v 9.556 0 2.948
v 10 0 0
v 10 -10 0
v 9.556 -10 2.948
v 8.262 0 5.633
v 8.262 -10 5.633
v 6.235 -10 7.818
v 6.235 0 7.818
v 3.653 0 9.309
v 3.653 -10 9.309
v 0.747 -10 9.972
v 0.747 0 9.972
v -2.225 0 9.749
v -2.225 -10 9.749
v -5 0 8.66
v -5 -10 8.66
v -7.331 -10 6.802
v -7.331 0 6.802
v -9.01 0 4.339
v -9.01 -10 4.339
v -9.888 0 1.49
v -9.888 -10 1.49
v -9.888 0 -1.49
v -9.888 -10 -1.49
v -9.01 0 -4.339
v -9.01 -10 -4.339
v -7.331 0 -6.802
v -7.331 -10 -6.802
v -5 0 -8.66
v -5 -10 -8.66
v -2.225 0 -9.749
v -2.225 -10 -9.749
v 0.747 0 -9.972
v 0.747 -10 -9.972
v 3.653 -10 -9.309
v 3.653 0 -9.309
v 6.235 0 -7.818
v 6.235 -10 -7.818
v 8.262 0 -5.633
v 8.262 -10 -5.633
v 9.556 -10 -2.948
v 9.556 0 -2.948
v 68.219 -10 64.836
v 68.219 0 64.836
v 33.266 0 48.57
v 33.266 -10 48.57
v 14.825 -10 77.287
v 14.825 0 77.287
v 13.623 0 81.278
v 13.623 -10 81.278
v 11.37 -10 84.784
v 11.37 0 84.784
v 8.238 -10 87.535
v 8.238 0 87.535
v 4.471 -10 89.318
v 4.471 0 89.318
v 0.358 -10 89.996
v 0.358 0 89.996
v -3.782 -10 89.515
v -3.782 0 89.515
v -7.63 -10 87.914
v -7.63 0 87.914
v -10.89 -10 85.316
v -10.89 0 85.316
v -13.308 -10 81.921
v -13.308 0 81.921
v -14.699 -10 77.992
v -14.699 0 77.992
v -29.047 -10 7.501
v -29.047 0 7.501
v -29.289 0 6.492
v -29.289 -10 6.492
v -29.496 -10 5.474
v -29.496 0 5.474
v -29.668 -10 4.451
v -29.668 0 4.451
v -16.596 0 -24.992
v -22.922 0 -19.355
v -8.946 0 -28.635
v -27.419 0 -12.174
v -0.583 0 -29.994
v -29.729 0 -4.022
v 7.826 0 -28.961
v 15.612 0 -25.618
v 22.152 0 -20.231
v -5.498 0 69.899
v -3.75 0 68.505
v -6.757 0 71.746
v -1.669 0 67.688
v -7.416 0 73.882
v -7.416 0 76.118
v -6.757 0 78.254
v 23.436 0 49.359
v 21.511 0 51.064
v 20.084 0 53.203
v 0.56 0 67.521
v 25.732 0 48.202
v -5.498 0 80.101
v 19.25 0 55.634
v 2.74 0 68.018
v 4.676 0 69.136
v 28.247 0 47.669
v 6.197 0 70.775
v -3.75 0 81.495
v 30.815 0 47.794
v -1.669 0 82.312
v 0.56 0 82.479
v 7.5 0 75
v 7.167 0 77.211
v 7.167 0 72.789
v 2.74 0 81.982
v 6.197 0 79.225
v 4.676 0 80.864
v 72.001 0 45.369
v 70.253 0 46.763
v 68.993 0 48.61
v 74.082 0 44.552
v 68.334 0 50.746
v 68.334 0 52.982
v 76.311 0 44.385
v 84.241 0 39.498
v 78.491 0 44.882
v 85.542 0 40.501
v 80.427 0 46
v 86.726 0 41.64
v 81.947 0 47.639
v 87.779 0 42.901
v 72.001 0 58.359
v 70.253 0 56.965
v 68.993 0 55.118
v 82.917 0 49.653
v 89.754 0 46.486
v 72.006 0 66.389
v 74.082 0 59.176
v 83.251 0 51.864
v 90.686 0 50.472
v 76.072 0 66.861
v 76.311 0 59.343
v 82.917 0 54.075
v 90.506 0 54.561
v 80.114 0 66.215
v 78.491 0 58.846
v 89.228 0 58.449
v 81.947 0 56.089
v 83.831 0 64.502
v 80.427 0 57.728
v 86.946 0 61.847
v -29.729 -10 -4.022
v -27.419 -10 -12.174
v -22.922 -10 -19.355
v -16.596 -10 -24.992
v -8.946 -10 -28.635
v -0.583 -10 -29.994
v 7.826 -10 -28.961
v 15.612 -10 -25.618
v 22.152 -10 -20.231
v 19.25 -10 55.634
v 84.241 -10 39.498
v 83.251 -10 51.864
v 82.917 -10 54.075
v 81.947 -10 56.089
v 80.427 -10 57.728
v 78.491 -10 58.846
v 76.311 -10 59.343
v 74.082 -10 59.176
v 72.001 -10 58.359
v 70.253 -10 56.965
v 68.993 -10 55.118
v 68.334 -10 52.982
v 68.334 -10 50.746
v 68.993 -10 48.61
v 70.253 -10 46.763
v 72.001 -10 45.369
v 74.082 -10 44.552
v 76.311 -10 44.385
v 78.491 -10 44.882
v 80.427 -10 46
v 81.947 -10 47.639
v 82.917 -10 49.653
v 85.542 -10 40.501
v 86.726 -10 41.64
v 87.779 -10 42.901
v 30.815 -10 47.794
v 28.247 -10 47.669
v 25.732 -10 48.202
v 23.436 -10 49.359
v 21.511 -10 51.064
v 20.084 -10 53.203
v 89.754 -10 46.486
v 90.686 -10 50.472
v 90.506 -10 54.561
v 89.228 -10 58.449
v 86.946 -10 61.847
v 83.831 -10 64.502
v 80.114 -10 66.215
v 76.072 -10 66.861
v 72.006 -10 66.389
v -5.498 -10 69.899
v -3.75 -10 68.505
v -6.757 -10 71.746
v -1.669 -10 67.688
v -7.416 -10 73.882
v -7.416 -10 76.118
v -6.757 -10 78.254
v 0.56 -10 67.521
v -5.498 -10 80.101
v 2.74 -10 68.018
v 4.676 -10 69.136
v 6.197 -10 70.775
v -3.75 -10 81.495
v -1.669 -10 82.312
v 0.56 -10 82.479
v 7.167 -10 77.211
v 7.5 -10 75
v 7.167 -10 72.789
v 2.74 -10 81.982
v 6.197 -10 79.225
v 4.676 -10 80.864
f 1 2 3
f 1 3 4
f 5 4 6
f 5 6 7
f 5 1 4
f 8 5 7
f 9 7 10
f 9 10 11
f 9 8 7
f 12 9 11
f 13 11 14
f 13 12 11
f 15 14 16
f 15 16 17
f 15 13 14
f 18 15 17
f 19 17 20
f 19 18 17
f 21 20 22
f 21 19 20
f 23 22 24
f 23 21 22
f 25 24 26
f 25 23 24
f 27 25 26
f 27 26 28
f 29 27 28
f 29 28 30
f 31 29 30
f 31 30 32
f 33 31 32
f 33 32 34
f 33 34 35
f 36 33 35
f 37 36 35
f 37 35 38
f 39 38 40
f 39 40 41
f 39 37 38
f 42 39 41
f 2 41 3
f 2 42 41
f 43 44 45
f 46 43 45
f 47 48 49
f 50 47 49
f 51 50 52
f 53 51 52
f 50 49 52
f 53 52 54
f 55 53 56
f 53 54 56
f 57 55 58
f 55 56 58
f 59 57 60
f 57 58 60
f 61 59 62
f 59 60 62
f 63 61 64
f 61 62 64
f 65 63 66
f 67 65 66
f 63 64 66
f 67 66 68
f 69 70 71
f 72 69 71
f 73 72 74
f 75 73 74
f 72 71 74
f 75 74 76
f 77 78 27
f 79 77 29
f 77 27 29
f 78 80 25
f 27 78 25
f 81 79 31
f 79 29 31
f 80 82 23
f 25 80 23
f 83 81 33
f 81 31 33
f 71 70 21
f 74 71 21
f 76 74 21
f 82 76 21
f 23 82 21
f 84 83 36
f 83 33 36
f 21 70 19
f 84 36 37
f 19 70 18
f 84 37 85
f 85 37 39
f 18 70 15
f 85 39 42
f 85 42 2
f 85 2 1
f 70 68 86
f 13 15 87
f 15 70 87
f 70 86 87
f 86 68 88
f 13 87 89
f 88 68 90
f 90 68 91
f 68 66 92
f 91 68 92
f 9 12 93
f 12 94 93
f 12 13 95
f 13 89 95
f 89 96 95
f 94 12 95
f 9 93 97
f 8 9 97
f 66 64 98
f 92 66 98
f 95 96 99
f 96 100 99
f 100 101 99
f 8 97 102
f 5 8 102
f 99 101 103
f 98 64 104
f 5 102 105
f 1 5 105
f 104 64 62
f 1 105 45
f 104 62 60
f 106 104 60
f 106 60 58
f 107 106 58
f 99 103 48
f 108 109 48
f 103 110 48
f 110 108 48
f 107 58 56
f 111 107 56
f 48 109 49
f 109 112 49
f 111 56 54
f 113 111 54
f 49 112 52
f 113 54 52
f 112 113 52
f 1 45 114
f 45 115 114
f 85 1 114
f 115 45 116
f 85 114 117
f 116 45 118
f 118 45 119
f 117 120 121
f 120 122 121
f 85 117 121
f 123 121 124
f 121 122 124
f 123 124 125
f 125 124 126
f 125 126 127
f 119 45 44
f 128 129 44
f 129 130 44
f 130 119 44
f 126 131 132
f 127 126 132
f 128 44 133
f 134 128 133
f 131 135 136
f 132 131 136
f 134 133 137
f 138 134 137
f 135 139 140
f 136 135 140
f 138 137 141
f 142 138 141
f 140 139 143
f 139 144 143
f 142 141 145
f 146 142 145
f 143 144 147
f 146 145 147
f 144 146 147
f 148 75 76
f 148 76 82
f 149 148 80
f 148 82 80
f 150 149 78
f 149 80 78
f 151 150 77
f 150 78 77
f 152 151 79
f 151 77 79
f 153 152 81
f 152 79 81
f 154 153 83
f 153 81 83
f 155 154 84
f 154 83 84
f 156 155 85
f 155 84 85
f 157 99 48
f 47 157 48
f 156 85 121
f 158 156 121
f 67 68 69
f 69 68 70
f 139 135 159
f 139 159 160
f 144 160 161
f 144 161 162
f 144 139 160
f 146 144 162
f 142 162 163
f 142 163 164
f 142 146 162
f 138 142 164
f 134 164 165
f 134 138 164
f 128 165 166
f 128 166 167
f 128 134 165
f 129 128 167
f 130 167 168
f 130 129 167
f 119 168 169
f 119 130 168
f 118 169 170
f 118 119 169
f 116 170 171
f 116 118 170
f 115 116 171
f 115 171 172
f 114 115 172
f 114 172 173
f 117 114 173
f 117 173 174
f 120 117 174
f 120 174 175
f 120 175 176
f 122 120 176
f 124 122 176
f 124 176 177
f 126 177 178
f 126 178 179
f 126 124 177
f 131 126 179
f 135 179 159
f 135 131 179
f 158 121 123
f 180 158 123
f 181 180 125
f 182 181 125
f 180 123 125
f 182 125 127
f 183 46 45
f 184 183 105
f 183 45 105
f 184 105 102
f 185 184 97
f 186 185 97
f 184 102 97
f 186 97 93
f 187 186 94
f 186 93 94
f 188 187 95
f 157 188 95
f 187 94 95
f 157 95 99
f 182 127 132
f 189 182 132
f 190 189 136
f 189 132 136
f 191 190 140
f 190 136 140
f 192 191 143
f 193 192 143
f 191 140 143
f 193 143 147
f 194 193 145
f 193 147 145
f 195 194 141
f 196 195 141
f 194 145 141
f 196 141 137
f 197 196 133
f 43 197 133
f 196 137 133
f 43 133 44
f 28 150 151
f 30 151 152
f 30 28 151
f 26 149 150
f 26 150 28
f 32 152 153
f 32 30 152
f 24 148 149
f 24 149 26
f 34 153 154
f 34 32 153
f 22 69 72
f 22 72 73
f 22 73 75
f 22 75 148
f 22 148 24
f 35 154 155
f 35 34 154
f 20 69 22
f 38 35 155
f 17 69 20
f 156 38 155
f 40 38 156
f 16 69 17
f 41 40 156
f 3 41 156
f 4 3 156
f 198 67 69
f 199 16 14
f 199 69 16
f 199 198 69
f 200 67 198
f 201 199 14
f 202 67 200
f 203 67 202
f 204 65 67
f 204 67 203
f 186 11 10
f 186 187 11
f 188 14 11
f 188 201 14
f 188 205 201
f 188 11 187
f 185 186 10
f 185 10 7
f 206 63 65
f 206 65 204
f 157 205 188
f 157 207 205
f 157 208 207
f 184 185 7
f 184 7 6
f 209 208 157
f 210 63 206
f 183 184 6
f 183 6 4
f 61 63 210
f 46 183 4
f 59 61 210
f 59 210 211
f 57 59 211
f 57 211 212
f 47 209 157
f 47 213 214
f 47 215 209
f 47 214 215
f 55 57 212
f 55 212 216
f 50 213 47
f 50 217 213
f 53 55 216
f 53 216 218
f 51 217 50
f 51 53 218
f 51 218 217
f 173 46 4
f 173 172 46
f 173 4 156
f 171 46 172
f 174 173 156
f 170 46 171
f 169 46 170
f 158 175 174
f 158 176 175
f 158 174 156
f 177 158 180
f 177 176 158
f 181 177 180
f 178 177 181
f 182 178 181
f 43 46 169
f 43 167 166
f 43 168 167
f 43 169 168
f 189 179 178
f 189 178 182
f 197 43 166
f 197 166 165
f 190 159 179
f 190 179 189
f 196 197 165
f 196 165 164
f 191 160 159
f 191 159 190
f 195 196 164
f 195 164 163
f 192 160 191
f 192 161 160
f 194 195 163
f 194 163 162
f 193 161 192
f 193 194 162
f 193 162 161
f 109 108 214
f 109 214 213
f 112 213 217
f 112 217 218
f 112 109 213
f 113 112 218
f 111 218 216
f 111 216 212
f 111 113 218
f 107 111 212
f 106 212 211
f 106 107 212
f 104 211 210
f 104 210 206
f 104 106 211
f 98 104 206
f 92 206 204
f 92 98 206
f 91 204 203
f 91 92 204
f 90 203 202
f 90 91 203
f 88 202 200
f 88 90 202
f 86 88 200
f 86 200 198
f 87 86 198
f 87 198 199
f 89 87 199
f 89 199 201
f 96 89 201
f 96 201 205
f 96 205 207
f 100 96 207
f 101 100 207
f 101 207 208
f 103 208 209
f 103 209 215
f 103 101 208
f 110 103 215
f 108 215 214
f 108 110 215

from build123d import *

# Parameters (mm, degrees)
F0_R     = 10
F0_R_2   = 7.5
F1_DEPTH = 10


with BuildPart() as f1:
    # F0 (on Front) → F1 (new body)
    with BuildSketch(Plane.XZ):
        with BuildLine():
            Line((19.249851, 55.634453), (14.824665, 77.286766))
            ThreePointArc((14.824665, 77.286766), (0.358168, 89.995723), (-14.698586, 77.991918))
            Line((-14.698586, 77.991918), (-29.047106, 7.501041))
            Line((-29.047106, 7.501041), (-29.668046, 4.450513))
            ThreePointArc((-29.668046, 4.450513), (-12.900348, -27.084701), (22.151807, -20.231101))
            Line((22.151807, -20.231101), (84.240741, 39.498036))
            Line((84.240741, 39.498036), (87.778566, 42.9014))
            ThreePointArc((87.778566, 42.9014), (86.94615, 61.847062), (68.219281, 64.836271))
            Line((68.219281, 64.836271), (33.26649, 48.570462))
            ThreePointArc((33.26649, 48.570462), (24.54684, 48.70677), (19.249851, 55.634453))
        make_face()
        Circle(F0_R, mode=Mode.SUBTRACT)
        with Locations((0, 75)):
            Circle(F0_R_2, mode=Mode.SUBTRACT)
        with Locations((75.750642, 51.864047)):
            Circle(F0_R_2, mode=Mode.SUBTRACT)
        with BuildLine():
            Line((-29.668046, 4.450513), (-29.047106, 7.501041))
            ThreePointArc((-29.047106, 7.501041), (-29.397172, 5.983837), (-29.668046, 4.450513))
        make_face()
        with BuildLine():
            ThreePointArc((84.240741, 39.498036), (86.149827, 41.054007), (87.778566, 42.9014))
            Line((87.778566, 42.9014), (84.240741, 39.498036))
        make_face()
    extrude(amount=F1_DEPTH)


solid = f1.part
